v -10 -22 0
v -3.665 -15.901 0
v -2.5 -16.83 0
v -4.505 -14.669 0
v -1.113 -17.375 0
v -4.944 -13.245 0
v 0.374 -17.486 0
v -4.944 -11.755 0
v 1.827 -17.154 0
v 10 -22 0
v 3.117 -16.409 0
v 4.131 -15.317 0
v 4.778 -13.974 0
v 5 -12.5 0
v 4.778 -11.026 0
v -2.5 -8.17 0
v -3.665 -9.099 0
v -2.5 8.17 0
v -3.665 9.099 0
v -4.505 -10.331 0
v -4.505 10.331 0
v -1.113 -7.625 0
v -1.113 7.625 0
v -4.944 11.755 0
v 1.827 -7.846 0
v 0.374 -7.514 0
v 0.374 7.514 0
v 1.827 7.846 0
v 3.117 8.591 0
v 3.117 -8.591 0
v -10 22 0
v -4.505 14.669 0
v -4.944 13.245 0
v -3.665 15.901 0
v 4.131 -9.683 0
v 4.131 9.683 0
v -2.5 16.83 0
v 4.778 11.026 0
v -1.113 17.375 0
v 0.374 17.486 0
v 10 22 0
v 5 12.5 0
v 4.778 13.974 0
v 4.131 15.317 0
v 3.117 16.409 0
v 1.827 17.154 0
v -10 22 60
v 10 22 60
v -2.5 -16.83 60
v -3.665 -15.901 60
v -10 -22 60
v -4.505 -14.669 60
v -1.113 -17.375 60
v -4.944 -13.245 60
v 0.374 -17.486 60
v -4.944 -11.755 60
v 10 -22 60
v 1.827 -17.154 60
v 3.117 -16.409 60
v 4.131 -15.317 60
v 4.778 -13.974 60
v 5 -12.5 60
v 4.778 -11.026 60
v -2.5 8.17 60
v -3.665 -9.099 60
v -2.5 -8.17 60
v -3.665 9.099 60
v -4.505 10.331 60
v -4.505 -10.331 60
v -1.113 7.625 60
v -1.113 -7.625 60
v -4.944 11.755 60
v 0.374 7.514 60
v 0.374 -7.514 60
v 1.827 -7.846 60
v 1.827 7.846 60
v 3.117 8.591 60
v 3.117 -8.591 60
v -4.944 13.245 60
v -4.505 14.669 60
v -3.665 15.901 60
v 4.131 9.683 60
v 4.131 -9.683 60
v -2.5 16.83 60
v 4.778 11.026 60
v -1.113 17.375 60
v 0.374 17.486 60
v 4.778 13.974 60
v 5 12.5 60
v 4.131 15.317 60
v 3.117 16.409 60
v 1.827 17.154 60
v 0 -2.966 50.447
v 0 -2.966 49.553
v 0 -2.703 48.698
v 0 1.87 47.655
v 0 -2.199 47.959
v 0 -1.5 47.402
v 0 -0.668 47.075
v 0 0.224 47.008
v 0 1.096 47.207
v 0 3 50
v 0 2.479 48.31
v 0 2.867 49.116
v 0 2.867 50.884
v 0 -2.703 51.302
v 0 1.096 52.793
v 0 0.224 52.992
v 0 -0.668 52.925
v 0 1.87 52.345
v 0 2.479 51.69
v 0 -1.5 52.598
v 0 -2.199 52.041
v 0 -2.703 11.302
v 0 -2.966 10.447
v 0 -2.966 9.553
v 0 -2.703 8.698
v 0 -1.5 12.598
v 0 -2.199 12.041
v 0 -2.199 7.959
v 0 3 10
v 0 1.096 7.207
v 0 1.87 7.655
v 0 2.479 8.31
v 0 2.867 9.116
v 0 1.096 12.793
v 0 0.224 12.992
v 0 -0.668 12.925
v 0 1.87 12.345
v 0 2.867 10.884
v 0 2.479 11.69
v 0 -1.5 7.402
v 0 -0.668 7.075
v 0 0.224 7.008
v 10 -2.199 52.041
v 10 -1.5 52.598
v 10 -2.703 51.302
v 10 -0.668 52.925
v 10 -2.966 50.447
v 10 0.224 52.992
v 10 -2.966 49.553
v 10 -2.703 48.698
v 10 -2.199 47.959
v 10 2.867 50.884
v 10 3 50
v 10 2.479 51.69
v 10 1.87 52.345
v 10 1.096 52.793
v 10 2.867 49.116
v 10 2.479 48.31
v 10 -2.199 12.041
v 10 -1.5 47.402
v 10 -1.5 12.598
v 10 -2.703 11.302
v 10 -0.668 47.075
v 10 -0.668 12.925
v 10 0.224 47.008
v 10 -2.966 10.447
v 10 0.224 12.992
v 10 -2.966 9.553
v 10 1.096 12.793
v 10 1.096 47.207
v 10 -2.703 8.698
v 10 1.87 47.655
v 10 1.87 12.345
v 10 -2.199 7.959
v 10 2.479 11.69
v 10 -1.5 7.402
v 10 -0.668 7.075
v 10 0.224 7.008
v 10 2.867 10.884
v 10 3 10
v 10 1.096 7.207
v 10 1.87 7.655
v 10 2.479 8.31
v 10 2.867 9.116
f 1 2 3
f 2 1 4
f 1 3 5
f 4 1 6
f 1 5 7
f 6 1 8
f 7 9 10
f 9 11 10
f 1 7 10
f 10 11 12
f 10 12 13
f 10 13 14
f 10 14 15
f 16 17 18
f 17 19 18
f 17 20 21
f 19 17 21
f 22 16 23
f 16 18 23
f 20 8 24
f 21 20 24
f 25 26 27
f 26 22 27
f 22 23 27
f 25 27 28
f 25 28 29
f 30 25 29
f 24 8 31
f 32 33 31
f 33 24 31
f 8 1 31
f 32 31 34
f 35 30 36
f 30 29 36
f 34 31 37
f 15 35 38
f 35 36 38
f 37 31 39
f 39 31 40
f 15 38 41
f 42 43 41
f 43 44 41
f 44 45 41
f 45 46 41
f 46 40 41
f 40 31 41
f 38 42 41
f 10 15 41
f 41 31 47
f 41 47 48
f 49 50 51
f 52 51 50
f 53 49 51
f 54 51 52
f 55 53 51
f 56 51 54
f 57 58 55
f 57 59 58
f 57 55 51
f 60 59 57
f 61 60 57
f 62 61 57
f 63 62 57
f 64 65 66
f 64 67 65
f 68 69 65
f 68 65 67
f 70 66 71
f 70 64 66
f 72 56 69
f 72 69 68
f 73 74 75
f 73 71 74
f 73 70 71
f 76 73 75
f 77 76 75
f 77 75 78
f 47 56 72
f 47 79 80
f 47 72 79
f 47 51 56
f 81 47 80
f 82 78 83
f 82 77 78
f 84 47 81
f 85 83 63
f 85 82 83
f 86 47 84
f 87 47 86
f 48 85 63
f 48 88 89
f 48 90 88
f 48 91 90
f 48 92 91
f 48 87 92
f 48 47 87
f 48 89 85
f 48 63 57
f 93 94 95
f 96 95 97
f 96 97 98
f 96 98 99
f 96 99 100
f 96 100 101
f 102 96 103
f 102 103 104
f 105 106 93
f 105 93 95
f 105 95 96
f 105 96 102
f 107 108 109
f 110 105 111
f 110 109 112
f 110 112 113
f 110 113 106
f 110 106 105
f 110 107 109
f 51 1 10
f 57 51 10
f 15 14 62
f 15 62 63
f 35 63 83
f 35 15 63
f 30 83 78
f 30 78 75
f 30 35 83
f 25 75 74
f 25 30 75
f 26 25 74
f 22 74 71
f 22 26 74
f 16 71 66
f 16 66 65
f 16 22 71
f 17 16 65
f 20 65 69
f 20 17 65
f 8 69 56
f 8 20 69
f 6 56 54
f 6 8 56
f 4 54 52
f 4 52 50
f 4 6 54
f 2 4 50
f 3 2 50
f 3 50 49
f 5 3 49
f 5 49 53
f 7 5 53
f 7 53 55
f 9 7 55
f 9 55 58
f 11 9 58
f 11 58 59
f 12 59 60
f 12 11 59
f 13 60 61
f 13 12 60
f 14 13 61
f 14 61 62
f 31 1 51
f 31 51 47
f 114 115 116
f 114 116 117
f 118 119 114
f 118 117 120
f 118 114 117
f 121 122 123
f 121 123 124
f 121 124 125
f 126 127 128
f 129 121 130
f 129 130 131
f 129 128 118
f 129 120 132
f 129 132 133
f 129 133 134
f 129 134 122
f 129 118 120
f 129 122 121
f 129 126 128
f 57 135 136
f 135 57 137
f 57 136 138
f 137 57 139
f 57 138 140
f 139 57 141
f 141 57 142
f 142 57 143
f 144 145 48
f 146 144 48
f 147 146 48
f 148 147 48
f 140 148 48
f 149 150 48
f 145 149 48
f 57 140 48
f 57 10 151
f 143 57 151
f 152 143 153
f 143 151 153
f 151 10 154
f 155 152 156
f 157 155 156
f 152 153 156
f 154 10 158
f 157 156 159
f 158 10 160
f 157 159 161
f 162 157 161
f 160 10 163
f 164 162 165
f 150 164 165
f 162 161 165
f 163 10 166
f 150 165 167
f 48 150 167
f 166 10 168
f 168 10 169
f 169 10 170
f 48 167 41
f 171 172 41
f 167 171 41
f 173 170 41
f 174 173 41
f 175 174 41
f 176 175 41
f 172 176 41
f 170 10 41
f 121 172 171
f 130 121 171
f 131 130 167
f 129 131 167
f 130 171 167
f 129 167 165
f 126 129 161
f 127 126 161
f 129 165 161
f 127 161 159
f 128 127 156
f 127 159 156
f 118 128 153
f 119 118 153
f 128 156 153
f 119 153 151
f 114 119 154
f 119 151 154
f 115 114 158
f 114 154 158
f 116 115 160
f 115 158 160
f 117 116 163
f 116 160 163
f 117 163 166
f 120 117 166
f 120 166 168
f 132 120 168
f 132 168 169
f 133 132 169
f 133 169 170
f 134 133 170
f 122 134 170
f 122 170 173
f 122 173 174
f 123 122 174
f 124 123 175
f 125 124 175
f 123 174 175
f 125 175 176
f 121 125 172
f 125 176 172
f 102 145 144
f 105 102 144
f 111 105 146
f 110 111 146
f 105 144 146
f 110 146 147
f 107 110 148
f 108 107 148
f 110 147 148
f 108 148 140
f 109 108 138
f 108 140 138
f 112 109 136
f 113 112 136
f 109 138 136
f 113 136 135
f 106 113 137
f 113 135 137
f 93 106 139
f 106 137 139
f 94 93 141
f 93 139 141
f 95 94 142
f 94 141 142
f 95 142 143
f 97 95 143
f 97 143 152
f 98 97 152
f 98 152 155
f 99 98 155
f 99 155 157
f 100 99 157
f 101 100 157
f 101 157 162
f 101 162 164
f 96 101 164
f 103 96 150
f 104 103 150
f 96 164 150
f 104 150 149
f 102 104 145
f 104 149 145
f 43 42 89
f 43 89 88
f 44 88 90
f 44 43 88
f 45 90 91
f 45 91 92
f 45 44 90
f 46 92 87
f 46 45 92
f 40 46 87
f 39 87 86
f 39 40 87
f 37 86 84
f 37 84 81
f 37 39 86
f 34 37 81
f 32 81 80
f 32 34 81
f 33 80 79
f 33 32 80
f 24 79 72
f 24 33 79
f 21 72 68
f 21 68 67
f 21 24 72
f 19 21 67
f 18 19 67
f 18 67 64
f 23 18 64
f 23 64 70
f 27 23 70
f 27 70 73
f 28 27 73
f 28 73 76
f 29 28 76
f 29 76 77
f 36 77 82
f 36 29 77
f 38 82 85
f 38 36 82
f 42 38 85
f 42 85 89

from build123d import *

# Parameters (mm, degrees)
F0_W     = 20
F0_H     = 44
F0_R     = 5
F1_DEPTH = 60
F2_R     = 3
F3_DEPTH = 10


with BuildPart() as f1:
    # F0 (on Top) → F1 (new body)
    with BuildSketch(Plane.XY):
        Rectangle(F0_W, F0_H)
        with Locations((0, -12.5)):
            Circle(F0_R, mode=Mode.SUBTRACT)
        with Locations((0, 12.5)):
            Circle(F0_R, mode=Mode.SUBTRACT)
    extrude(amount=F1_DEPTH)

    # F2 (on face) → F3 (cut)
    with BuildSketch(Plane.YZ.offset(10)):
        with Locations((0, 50)):
            Circle(F2_R)
        with Locations((0, 10)):
            Circle(F2_R)
    extrude(amount=-F3_DEPTH, mode=Mode.SUBTRACT)


solid = f1.part
